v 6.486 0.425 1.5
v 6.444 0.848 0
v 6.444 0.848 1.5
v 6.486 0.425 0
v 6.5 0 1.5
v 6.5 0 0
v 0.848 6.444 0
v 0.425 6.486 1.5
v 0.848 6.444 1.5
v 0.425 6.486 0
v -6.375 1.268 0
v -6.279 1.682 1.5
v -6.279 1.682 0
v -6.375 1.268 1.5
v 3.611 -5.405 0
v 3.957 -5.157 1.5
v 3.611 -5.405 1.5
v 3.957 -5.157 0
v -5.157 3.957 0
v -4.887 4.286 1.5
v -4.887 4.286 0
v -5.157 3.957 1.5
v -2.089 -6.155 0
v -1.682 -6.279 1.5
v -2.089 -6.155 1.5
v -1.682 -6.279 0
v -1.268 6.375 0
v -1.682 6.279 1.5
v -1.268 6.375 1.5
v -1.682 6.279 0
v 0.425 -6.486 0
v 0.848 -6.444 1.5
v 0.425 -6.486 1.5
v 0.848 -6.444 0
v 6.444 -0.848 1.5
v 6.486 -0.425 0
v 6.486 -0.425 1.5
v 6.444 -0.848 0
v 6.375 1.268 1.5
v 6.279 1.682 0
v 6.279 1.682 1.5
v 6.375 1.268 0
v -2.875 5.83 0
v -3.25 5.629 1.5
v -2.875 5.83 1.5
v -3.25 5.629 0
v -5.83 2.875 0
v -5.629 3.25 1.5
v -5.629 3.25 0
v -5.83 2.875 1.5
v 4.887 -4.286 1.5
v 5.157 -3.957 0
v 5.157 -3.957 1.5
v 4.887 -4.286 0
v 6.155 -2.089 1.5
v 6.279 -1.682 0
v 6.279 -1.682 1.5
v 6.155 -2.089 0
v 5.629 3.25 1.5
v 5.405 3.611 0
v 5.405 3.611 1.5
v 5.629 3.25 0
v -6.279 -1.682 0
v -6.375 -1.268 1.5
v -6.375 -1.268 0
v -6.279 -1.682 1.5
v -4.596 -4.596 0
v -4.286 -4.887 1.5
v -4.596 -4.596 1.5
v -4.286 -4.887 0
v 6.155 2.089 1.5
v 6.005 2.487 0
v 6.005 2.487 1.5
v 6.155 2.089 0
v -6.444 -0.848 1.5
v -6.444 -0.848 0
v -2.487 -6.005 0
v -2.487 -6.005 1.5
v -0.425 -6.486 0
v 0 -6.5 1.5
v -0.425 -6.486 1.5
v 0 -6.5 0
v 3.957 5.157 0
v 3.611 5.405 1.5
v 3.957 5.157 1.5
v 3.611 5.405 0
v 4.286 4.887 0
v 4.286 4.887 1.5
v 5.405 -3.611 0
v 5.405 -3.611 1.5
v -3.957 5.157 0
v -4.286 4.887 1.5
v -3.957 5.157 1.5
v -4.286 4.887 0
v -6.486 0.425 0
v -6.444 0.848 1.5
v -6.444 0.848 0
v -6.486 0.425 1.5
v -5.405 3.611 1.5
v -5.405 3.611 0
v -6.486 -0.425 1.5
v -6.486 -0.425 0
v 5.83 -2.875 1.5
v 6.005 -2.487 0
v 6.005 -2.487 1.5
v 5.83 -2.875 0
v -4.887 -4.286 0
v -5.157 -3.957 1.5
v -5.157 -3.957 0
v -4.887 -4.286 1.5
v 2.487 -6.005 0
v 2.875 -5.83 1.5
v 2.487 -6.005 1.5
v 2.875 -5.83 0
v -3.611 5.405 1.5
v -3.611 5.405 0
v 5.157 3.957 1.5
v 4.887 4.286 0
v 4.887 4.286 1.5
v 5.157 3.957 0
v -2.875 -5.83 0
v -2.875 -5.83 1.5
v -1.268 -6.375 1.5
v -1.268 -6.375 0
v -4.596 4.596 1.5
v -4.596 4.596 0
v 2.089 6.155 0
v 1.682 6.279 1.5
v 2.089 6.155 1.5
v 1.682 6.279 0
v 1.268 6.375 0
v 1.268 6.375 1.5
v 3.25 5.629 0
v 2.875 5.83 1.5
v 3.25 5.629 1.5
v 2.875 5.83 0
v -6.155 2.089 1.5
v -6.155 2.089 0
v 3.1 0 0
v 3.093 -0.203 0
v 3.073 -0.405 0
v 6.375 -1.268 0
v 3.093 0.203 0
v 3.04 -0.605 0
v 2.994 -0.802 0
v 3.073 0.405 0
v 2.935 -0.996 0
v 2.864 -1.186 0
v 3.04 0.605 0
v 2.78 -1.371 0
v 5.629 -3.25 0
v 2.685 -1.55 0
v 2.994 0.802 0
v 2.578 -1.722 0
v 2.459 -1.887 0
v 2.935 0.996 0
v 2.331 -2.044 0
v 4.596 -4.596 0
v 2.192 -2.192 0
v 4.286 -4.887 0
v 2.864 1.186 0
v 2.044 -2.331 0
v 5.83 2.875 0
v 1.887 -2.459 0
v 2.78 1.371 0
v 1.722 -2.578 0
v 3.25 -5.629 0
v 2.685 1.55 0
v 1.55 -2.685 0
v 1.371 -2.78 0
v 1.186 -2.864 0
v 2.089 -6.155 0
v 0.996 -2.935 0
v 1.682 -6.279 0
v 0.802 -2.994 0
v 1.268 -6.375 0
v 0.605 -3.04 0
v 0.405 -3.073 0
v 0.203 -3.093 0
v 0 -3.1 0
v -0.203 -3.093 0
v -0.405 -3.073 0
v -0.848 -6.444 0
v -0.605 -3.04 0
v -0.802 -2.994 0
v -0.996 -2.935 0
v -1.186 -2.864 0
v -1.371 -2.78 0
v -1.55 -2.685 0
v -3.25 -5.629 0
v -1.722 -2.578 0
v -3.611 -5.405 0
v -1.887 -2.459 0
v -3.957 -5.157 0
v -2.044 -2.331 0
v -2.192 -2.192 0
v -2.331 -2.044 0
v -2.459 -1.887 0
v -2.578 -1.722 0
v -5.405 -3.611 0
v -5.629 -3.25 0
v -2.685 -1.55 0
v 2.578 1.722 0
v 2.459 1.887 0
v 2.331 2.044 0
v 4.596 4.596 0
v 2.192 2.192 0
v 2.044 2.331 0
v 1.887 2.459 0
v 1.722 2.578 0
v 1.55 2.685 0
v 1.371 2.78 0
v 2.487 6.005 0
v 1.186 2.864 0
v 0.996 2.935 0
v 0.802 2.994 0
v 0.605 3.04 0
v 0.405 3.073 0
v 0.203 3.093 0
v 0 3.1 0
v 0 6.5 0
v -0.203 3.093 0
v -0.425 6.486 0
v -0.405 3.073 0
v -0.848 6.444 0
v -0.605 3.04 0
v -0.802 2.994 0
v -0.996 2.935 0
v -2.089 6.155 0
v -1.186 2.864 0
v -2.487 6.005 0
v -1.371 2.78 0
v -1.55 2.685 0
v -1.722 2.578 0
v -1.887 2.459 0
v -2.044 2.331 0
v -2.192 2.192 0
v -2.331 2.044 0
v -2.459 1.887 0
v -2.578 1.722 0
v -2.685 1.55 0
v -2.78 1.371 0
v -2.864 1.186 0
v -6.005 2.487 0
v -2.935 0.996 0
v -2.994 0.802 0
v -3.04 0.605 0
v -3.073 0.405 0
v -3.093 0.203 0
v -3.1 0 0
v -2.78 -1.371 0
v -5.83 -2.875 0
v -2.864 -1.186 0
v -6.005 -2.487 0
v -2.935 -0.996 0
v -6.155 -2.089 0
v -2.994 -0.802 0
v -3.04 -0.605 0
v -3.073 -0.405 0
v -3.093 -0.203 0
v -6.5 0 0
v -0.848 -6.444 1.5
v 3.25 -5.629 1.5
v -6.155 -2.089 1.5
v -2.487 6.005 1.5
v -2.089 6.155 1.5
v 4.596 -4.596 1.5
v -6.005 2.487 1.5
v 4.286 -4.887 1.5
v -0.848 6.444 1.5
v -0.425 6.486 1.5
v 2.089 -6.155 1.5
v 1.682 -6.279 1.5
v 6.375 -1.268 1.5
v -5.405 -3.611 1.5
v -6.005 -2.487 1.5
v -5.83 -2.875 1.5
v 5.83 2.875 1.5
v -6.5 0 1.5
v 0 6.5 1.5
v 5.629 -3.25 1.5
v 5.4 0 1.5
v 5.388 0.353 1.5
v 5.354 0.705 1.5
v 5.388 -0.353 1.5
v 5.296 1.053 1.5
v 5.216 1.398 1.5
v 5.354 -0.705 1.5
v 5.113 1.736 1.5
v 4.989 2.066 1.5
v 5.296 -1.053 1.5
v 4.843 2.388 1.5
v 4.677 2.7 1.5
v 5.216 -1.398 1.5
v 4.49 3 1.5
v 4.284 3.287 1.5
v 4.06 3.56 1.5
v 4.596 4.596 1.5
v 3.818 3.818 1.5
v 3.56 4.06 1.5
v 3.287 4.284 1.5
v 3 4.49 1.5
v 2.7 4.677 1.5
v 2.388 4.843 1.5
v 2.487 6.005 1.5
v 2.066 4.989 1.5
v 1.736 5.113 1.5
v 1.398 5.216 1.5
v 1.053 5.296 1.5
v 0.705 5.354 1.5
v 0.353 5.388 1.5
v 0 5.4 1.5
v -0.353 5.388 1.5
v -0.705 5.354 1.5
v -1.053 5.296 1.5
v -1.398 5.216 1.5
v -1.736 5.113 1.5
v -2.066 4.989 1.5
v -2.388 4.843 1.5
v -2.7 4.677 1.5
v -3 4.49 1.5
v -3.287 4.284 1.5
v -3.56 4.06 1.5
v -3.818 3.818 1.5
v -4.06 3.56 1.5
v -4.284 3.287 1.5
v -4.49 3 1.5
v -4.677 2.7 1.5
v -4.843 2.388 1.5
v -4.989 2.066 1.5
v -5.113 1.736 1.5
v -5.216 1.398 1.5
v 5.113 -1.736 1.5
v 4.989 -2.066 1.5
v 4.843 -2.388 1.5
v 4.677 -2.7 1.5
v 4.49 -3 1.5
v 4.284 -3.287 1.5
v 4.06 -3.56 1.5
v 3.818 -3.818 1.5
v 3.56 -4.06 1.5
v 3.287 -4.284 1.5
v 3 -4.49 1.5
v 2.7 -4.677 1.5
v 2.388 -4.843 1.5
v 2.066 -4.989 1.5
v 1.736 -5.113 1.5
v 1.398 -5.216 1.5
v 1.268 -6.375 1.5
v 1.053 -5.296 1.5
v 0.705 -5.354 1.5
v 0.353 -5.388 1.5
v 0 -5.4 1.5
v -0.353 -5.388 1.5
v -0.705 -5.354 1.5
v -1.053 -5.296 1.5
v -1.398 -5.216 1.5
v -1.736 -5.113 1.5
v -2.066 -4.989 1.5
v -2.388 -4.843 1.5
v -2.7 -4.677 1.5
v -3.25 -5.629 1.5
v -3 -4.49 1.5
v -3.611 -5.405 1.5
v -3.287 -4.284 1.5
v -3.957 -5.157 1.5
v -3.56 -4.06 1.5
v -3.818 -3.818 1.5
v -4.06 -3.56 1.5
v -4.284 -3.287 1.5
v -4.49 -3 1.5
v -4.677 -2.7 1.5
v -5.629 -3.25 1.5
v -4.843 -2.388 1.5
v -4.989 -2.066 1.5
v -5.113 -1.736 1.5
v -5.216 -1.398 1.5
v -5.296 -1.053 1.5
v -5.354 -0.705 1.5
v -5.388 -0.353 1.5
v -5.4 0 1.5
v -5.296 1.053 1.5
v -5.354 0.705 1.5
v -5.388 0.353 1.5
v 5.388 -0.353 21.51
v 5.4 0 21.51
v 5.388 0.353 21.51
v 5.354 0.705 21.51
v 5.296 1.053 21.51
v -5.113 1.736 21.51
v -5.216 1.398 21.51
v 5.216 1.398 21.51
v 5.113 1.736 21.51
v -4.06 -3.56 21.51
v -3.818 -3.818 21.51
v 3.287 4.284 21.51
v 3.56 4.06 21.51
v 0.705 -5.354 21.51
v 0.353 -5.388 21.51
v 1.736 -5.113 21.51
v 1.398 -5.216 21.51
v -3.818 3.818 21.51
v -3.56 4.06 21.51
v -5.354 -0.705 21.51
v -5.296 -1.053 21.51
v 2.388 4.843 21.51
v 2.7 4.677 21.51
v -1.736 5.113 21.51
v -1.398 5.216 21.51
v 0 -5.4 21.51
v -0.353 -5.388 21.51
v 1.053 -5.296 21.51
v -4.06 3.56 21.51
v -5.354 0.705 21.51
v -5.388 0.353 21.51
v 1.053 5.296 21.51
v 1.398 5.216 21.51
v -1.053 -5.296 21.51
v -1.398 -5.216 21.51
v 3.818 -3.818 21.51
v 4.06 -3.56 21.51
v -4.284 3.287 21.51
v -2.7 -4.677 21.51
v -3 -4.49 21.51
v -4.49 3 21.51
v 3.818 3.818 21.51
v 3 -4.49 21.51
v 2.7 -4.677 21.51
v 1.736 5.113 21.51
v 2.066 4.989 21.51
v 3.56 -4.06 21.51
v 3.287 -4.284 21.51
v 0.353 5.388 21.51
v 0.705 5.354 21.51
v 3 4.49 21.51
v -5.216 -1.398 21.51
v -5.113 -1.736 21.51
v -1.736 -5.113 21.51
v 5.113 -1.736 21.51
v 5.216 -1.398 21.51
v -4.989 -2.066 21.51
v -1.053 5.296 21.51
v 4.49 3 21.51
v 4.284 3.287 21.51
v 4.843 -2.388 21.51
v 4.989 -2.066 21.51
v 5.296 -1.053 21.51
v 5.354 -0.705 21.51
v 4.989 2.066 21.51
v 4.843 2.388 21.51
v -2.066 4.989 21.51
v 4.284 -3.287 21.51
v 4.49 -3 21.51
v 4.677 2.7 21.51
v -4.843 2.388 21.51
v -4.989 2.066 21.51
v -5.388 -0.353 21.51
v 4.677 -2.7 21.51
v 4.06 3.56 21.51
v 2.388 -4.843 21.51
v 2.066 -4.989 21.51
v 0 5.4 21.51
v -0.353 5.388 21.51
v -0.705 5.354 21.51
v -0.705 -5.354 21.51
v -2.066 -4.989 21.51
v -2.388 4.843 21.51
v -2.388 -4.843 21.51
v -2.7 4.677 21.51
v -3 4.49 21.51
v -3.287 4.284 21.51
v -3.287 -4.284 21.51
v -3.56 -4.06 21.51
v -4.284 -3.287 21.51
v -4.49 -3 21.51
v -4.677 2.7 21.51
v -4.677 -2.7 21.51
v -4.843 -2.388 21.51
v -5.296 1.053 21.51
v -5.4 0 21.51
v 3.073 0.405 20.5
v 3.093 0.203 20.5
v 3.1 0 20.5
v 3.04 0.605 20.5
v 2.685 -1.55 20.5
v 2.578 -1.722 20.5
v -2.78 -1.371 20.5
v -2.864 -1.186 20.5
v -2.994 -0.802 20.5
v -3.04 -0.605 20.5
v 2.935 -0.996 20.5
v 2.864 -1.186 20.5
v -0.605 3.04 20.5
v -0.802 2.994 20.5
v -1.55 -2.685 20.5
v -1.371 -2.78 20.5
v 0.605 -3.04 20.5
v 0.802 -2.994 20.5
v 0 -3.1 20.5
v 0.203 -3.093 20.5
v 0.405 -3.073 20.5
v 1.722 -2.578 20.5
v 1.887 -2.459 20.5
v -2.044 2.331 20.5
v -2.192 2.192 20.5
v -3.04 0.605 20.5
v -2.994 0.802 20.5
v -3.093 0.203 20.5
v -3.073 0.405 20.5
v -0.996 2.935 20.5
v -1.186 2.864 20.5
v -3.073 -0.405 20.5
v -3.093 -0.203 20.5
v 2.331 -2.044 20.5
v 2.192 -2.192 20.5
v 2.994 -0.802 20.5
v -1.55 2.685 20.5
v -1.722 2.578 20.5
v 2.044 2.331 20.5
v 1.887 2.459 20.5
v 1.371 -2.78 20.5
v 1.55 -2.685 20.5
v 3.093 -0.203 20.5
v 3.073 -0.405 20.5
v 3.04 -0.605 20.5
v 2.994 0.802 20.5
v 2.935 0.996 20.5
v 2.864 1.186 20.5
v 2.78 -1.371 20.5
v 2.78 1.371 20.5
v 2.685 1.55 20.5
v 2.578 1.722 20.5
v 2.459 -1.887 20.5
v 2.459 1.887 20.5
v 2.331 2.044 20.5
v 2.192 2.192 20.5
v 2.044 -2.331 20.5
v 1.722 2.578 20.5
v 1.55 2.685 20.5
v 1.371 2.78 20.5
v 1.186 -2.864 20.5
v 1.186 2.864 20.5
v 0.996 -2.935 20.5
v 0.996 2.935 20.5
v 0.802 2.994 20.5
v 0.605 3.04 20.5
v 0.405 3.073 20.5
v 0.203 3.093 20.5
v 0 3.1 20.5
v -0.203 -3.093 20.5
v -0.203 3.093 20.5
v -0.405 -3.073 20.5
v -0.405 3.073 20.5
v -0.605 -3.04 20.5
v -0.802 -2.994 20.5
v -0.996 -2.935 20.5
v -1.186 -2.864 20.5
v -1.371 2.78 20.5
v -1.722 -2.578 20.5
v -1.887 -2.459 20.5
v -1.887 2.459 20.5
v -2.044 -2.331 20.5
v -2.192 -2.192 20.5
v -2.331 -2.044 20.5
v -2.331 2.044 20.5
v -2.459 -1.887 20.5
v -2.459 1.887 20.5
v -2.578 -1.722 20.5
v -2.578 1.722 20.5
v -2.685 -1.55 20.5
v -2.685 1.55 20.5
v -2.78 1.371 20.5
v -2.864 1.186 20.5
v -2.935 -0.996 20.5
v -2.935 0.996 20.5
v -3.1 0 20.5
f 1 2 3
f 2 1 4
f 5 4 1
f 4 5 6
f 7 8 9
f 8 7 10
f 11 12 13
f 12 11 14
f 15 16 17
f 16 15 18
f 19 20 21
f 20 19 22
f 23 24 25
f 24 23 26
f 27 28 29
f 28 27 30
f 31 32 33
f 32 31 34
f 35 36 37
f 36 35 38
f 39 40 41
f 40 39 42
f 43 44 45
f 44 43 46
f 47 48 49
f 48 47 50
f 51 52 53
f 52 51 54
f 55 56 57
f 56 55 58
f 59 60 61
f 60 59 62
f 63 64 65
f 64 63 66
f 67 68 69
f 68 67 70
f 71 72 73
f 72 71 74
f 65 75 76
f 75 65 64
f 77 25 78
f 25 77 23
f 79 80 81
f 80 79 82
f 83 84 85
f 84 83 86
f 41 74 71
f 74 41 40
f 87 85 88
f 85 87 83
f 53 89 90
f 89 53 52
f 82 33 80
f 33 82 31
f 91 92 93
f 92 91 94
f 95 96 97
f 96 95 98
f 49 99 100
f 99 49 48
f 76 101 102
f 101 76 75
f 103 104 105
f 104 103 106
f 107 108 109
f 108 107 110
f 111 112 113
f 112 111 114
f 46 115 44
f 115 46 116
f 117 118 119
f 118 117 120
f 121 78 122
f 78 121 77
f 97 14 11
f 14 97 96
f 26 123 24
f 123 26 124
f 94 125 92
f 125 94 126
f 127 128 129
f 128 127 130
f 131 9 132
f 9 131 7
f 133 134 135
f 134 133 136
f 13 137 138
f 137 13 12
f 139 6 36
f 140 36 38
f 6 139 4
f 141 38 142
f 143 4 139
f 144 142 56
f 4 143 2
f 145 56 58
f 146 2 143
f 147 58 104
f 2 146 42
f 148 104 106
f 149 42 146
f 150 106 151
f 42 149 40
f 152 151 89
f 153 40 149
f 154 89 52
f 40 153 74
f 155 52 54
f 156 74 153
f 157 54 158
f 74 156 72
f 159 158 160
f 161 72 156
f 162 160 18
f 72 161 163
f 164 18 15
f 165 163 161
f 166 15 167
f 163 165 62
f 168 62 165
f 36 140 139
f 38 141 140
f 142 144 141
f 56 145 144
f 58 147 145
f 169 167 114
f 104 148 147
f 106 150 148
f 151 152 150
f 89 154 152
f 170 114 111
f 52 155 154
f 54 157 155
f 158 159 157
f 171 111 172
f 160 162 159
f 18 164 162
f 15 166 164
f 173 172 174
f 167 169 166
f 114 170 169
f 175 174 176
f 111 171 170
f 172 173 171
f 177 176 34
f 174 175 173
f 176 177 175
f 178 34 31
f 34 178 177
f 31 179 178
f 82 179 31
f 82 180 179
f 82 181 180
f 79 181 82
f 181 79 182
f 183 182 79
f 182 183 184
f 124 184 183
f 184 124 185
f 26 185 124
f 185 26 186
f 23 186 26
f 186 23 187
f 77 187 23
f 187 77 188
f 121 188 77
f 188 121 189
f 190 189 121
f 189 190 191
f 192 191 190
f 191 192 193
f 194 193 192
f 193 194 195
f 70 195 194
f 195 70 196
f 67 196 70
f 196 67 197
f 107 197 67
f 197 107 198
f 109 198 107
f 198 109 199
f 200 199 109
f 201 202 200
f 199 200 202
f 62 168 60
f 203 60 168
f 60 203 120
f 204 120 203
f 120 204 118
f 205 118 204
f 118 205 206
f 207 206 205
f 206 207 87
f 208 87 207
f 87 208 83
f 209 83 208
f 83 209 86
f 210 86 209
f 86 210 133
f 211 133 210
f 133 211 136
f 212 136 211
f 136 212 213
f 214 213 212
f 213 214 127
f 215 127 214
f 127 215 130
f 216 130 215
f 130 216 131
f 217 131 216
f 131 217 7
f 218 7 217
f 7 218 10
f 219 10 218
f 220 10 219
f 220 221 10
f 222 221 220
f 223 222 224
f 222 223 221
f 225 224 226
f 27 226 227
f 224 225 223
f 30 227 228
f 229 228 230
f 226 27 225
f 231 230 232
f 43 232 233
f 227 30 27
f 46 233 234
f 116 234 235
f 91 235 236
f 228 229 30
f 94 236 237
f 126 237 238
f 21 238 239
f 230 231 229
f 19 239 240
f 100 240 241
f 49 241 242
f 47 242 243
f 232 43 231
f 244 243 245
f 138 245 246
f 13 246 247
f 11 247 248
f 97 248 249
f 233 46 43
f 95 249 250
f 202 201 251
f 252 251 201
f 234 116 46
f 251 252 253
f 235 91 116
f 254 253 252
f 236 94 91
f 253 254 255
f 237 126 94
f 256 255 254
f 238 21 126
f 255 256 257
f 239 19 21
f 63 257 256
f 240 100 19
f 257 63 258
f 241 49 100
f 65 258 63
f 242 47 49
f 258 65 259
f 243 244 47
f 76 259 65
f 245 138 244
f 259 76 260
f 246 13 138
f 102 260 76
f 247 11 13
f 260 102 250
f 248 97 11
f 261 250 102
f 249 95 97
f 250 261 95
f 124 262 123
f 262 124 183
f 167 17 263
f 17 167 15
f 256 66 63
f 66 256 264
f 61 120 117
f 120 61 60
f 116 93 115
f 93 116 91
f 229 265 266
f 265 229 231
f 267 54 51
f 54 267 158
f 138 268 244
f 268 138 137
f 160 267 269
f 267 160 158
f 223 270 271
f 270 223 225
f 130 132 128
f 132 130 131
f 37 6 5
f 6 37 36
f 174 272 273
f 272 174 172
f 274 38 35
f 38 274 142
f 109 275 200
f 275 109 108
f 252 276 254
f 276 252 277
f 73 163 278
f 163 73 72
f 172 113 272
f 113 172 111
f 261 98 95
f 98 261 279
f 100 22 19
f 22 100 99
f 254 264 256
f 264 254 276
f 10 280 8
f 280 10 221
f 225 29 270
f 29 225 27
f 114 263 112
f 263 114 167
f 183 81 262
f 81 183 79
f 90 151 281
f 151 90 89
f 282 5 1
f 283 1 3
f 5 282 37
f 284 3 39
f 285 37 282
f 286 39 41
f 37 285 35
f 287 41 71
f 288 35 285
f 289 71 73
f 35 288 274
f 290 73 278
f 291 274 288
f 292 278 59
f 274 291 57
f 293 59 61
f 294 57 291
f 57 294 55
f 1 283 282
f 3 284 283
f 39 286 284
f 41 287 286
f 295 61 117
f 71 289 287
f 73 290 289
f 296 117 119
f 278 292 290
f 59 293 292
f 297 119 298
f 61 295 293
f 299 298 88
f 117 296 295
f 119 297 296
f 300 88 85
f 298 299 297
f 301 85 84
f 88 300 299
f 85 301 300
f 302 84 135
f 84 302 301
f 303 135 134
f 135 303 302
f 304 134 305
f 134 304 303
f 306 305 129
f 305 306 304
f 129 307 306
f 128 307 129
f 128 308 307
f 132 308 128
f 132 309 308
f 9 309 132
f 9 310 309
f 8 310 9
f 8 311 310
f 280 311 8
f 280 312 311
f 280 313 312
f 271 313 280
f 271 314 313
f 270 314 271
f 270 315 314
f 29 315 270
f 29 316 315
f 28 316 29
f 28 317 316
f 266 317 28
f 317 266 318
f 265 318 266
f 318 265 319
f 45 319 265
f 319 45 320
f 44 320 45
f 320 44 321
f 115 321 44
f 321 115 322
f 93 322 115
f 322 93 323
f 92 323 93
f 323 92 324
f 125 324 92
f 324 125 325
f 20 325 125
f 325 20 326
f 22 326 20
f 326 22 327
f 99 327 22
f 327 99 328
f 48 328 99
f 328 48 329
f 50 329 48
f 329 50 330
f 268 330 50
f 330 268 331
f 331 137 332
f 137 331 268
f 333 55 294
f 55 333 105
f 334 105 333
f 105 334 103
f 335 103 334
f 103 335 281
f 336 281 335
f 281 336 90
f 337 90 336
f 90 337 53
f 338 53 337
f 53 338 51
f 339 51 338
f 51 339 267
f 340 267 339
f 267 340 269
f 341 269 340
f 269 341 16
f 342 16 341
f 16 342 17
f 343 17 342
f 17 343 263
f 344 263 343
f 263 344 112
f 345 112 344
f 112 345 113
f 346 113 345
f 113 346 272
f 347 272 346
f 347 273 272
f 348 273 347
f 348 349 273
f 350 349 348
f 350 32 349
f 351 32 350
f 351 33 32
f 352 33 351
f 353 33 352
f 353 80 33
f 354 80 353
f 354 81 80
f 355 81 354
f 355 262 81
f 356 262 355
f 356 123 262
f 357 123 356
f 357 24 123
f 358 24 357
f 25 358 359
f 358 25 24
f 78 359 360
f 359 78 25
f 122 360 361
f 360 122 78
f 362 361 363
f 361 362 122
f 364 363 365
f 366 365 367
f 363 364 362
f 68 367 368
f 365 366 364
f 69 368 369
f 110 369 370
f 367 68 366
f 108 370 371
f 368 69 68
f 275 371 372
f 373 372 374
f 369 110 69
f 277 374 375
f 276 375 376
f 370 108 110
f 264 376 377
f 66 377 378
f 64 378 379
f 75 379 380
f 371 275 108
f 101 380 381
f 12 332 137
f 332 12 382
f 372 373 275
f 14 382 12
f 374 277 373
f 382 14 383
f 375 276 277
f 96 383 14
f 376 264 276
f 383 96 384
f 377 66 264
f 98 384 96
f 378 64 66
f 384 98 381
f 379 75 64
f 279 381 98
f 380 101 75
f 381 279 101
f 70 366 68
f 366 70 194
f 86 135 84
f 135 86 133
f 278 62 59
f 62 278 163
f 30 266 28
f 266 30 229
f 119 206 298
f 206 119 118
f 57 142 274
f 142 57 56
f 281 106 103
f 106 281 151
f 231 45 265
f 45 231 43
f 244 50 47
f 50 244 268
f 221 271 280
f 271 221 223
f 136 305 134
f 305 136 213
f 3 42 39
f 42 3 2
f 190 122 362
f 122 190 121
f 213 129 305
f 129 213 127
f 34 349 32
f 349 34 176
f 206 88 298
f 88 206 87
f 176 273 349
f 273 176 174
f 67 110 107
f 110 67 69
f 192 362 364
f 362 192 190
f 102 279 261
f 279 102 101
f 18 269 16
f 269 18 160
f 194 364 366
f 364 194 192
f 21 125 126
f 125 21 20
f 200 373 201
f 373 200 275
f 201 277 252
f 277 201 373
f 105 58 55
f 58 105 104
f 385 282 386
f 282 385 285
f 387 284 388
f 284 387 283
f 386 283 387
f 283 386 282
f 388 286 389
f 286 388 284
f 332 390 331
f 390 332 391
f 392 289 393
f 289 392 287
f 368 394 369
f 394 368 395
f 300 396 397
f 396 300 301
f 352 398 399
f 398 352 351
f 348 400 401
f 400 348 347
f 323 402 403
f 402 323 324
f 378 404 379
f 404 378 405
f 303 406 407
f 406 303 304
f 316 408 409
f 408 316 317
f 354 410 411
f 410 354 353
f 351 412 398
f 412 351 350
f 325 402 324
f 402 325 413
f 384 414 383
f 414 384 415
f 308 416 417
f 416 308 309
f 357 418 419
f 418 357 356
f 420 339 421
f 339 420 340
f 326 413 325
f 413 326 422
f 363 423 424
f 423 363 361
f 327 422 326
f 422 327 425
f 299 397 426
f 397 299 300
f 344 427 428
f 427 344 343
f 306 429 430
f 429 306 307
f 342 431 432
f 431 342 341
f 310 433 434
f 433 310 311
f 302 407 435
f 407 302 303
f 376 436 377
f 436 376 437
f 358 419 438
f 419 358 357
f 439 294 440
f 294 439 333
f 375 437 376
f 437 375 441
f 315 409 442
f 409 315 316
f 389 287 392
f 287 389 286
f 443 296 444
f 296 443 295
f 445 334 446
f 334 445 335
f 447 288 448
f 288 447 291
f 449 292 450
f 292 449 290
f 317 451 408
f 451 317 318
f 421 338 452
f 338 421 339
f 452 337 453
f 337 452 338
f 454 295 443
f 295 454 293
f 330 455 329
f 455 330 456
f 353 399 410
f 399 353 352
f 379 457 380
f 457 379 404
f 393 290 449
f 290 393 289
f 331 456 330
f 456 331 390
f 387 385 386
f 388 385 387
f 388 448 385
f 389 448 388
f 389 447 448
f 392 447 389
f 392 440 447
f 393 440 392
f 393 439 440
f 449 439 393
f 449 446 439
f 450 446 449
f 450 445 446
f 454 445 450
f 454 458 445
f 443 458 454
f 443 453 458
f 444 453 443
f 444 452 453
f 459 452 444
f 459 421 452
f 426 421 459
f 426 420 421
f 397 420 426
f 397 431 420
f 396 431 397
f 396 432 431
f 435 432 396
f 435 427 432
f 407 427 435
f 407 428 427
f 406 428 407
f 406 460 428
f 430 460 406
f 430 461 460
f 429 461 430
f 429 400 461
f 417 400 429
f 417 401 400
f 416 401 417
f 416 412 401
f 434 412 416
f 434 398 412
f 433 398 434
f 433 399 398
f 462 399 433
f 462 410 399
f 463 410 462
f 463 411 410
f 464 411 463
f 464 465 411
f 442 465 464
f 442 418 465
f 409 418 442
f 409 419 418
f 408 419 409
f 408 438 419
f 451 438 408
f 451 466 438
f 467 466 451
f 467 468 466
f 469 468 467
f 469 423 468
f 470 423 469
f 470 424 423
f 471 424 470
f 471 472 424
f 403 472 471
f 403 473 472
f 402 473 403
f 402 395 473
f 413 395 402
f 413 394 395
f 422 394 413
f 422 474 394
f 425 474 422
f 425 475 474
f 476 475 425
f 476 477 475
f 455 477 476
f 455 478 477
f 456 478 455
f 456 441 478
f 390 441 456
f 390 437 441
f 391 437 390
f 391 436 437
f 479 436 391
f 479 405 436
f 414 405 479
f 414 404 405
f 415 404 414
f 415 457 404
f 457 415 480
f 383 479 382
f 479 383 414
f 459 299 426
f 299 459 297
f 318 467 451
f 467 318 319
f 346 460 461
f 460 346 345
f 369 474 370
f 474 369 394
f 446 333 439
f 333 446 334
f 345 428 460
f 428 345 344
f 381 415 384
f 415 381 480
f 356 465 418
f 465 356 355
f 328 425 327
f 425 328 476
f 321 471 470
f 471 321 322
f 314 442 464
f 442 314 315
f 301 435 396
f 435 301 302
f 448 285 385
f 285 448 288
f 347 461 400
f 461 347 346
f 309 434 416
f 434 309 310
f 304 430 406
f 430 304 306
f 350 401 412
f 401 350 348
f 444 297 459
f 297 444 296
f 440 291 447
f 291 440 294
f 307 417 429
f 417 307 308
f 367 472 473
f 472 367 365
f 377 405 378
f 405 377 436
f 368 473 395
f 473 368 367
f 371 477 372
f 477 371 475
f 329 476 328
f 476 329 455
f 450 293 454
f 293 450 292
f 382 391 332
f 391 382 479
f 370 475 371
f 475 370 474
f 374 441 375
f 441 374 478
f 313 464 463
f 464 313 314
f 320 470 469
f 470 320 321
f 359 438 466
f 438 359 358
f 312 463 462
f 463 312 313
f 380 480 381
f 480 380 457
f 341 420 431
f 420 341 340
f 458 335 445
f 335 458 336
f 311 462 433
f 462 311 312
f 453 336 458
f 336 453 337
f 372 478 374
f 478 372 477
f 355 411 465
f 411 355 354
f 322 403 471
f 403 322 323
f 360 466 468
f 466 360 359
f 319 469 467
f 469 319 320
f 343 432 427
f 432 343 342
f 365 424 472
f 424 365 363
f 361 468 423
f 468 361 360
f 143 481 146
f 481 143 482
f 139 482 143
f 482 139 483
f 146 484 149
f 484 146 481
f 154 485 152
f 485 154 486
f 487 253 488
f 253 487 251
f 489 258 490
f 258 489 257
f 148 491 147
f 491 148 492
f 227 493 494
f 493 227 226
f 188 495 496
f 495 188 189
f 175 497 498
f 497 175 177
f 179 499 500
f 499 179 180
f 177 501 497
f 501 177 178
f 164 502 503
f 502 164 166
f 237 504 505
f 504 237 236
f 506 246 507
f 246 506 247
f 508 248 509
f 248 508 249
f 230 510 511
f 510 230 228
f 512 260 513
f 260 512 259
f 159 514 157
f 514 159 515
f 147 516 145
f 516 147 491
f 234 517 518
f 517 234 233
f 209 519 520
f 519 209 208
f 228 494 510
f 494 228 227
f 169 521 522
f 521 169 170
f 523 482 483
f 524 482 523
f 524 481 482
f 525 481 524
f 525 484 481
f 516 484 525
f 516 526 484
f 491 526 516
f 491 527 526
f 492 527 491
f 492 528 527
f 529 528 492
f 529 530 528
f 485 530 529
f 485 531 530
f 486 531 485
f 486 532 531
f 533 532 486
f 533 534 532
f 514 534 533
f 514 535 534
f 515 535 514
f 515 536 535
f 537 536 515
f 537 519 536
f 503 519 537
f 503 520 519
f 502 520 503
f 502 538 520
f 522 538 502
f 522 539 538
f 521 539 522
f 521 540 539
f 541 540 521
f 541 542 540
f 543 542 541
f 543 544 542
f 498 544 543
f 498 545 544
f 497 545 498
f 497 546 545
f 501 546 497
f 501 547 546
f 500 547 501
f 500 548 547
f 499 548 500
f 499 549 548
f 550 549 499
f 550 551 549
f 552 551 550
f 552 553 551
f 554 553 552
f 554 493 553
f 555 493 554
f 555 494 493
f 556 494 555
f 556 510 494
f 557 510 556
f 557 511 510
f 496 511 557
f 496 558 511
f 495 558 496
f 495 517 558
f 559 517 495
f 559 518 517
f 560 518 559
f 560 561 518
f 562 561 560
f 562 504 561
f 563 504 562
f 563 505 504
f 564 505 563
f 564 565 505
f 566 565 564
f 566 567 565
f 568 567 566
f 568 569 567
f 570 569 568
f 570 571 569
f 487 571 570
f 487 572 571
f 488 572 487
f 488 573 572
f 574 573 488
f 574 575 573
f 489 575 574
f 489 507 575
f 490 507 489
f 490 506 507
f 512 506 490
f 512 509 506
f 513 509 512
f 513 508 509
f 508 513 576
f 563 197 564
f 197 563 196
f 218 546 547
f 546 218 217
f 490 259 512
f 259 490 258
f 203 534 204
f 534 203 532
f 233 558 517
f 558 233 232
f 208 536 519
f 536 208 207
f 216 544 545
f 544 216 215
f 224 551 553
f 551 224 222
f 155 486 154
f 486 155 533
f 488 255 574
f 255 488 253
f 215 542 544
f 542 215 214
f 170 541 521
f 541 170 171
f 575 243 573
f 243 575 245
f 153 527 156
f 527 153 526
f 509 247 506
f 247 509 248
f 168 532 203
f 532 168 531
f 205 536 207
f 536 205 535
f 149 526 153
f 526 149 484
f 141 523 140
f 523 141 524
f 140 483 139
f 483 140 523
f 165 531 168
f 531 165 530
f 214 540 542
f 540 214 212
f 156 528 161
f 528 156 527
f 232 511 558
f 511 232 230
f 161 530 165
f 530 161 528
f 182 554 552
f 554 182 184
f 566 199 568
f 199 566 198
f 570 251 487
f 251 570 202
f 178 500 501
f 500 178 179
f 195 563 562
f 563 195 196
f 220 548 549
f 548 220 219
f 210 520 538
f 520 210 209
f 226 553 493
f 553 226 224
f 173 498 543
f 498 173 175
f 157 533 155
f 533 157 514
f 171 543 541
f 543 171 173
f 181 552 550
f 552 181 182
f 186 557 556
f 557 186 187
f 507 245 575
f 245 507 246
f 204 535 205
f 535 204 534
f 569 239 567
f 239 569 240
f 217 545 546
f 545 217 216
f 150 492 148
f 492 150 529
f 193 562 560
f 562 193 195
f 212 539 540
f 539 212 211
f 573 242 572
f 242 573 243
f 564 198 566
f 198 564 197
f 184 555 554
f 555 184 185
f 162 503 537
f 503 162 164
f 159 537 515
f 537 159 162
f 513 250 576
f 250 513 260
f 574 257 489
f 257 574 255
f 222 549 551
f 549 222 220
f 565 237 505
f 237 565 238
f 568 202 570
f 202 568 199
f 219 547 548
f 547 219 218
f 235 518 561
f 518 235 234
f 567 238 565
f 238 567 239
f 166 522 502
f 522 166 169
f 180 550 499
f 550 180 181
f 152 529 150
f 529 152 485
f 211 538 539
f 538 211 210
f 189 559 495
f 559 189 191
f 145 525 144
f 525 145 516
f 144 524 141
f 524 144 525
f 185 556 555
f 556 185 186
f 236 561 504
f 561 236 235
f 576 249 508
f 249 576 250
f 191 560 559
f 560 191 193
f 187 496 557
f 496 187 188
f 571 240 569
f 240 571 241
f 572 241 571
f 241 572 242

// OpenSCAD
// Adapter sleeve: 0.2 mL PCR tube for a 1.5 mL rack hole
// Print orientation: collar on the bed (z = 0), sleeve body on top

$fn = 96;

// ---- Dimensions (mm) ----
collar_d      = 13;    // collar outer diameter
collar_h      = 1.5;   // collar thickness (z = 0 to 1.5)
sleeve_od     = 10.8;  // sleeve body outer diameter
sleeve_top_z  = 21.5;  // top of sleeve body (absolute z)
bore_d        = 6.2;   // through-bore diameter
eps           = 0.5;   // cutter overshoot past faces

bore_h        = sleeve_top_z - collar_h;  // bore height in sleeve body

difference() {
    union() {
        // Collar
        cylinder(d = collar_d, h = collar_h);
        // Sleeve body (from top of collar to top)
        translate([0, 0, collar_h])
            cylinder(d = sleeve_od, h = bore_h + 0.01);
    }
    // Through-bore
    translate([0, 0, -eps])
        cylinder(d = bore_d, h = bore_h + 2 * eps);
}
